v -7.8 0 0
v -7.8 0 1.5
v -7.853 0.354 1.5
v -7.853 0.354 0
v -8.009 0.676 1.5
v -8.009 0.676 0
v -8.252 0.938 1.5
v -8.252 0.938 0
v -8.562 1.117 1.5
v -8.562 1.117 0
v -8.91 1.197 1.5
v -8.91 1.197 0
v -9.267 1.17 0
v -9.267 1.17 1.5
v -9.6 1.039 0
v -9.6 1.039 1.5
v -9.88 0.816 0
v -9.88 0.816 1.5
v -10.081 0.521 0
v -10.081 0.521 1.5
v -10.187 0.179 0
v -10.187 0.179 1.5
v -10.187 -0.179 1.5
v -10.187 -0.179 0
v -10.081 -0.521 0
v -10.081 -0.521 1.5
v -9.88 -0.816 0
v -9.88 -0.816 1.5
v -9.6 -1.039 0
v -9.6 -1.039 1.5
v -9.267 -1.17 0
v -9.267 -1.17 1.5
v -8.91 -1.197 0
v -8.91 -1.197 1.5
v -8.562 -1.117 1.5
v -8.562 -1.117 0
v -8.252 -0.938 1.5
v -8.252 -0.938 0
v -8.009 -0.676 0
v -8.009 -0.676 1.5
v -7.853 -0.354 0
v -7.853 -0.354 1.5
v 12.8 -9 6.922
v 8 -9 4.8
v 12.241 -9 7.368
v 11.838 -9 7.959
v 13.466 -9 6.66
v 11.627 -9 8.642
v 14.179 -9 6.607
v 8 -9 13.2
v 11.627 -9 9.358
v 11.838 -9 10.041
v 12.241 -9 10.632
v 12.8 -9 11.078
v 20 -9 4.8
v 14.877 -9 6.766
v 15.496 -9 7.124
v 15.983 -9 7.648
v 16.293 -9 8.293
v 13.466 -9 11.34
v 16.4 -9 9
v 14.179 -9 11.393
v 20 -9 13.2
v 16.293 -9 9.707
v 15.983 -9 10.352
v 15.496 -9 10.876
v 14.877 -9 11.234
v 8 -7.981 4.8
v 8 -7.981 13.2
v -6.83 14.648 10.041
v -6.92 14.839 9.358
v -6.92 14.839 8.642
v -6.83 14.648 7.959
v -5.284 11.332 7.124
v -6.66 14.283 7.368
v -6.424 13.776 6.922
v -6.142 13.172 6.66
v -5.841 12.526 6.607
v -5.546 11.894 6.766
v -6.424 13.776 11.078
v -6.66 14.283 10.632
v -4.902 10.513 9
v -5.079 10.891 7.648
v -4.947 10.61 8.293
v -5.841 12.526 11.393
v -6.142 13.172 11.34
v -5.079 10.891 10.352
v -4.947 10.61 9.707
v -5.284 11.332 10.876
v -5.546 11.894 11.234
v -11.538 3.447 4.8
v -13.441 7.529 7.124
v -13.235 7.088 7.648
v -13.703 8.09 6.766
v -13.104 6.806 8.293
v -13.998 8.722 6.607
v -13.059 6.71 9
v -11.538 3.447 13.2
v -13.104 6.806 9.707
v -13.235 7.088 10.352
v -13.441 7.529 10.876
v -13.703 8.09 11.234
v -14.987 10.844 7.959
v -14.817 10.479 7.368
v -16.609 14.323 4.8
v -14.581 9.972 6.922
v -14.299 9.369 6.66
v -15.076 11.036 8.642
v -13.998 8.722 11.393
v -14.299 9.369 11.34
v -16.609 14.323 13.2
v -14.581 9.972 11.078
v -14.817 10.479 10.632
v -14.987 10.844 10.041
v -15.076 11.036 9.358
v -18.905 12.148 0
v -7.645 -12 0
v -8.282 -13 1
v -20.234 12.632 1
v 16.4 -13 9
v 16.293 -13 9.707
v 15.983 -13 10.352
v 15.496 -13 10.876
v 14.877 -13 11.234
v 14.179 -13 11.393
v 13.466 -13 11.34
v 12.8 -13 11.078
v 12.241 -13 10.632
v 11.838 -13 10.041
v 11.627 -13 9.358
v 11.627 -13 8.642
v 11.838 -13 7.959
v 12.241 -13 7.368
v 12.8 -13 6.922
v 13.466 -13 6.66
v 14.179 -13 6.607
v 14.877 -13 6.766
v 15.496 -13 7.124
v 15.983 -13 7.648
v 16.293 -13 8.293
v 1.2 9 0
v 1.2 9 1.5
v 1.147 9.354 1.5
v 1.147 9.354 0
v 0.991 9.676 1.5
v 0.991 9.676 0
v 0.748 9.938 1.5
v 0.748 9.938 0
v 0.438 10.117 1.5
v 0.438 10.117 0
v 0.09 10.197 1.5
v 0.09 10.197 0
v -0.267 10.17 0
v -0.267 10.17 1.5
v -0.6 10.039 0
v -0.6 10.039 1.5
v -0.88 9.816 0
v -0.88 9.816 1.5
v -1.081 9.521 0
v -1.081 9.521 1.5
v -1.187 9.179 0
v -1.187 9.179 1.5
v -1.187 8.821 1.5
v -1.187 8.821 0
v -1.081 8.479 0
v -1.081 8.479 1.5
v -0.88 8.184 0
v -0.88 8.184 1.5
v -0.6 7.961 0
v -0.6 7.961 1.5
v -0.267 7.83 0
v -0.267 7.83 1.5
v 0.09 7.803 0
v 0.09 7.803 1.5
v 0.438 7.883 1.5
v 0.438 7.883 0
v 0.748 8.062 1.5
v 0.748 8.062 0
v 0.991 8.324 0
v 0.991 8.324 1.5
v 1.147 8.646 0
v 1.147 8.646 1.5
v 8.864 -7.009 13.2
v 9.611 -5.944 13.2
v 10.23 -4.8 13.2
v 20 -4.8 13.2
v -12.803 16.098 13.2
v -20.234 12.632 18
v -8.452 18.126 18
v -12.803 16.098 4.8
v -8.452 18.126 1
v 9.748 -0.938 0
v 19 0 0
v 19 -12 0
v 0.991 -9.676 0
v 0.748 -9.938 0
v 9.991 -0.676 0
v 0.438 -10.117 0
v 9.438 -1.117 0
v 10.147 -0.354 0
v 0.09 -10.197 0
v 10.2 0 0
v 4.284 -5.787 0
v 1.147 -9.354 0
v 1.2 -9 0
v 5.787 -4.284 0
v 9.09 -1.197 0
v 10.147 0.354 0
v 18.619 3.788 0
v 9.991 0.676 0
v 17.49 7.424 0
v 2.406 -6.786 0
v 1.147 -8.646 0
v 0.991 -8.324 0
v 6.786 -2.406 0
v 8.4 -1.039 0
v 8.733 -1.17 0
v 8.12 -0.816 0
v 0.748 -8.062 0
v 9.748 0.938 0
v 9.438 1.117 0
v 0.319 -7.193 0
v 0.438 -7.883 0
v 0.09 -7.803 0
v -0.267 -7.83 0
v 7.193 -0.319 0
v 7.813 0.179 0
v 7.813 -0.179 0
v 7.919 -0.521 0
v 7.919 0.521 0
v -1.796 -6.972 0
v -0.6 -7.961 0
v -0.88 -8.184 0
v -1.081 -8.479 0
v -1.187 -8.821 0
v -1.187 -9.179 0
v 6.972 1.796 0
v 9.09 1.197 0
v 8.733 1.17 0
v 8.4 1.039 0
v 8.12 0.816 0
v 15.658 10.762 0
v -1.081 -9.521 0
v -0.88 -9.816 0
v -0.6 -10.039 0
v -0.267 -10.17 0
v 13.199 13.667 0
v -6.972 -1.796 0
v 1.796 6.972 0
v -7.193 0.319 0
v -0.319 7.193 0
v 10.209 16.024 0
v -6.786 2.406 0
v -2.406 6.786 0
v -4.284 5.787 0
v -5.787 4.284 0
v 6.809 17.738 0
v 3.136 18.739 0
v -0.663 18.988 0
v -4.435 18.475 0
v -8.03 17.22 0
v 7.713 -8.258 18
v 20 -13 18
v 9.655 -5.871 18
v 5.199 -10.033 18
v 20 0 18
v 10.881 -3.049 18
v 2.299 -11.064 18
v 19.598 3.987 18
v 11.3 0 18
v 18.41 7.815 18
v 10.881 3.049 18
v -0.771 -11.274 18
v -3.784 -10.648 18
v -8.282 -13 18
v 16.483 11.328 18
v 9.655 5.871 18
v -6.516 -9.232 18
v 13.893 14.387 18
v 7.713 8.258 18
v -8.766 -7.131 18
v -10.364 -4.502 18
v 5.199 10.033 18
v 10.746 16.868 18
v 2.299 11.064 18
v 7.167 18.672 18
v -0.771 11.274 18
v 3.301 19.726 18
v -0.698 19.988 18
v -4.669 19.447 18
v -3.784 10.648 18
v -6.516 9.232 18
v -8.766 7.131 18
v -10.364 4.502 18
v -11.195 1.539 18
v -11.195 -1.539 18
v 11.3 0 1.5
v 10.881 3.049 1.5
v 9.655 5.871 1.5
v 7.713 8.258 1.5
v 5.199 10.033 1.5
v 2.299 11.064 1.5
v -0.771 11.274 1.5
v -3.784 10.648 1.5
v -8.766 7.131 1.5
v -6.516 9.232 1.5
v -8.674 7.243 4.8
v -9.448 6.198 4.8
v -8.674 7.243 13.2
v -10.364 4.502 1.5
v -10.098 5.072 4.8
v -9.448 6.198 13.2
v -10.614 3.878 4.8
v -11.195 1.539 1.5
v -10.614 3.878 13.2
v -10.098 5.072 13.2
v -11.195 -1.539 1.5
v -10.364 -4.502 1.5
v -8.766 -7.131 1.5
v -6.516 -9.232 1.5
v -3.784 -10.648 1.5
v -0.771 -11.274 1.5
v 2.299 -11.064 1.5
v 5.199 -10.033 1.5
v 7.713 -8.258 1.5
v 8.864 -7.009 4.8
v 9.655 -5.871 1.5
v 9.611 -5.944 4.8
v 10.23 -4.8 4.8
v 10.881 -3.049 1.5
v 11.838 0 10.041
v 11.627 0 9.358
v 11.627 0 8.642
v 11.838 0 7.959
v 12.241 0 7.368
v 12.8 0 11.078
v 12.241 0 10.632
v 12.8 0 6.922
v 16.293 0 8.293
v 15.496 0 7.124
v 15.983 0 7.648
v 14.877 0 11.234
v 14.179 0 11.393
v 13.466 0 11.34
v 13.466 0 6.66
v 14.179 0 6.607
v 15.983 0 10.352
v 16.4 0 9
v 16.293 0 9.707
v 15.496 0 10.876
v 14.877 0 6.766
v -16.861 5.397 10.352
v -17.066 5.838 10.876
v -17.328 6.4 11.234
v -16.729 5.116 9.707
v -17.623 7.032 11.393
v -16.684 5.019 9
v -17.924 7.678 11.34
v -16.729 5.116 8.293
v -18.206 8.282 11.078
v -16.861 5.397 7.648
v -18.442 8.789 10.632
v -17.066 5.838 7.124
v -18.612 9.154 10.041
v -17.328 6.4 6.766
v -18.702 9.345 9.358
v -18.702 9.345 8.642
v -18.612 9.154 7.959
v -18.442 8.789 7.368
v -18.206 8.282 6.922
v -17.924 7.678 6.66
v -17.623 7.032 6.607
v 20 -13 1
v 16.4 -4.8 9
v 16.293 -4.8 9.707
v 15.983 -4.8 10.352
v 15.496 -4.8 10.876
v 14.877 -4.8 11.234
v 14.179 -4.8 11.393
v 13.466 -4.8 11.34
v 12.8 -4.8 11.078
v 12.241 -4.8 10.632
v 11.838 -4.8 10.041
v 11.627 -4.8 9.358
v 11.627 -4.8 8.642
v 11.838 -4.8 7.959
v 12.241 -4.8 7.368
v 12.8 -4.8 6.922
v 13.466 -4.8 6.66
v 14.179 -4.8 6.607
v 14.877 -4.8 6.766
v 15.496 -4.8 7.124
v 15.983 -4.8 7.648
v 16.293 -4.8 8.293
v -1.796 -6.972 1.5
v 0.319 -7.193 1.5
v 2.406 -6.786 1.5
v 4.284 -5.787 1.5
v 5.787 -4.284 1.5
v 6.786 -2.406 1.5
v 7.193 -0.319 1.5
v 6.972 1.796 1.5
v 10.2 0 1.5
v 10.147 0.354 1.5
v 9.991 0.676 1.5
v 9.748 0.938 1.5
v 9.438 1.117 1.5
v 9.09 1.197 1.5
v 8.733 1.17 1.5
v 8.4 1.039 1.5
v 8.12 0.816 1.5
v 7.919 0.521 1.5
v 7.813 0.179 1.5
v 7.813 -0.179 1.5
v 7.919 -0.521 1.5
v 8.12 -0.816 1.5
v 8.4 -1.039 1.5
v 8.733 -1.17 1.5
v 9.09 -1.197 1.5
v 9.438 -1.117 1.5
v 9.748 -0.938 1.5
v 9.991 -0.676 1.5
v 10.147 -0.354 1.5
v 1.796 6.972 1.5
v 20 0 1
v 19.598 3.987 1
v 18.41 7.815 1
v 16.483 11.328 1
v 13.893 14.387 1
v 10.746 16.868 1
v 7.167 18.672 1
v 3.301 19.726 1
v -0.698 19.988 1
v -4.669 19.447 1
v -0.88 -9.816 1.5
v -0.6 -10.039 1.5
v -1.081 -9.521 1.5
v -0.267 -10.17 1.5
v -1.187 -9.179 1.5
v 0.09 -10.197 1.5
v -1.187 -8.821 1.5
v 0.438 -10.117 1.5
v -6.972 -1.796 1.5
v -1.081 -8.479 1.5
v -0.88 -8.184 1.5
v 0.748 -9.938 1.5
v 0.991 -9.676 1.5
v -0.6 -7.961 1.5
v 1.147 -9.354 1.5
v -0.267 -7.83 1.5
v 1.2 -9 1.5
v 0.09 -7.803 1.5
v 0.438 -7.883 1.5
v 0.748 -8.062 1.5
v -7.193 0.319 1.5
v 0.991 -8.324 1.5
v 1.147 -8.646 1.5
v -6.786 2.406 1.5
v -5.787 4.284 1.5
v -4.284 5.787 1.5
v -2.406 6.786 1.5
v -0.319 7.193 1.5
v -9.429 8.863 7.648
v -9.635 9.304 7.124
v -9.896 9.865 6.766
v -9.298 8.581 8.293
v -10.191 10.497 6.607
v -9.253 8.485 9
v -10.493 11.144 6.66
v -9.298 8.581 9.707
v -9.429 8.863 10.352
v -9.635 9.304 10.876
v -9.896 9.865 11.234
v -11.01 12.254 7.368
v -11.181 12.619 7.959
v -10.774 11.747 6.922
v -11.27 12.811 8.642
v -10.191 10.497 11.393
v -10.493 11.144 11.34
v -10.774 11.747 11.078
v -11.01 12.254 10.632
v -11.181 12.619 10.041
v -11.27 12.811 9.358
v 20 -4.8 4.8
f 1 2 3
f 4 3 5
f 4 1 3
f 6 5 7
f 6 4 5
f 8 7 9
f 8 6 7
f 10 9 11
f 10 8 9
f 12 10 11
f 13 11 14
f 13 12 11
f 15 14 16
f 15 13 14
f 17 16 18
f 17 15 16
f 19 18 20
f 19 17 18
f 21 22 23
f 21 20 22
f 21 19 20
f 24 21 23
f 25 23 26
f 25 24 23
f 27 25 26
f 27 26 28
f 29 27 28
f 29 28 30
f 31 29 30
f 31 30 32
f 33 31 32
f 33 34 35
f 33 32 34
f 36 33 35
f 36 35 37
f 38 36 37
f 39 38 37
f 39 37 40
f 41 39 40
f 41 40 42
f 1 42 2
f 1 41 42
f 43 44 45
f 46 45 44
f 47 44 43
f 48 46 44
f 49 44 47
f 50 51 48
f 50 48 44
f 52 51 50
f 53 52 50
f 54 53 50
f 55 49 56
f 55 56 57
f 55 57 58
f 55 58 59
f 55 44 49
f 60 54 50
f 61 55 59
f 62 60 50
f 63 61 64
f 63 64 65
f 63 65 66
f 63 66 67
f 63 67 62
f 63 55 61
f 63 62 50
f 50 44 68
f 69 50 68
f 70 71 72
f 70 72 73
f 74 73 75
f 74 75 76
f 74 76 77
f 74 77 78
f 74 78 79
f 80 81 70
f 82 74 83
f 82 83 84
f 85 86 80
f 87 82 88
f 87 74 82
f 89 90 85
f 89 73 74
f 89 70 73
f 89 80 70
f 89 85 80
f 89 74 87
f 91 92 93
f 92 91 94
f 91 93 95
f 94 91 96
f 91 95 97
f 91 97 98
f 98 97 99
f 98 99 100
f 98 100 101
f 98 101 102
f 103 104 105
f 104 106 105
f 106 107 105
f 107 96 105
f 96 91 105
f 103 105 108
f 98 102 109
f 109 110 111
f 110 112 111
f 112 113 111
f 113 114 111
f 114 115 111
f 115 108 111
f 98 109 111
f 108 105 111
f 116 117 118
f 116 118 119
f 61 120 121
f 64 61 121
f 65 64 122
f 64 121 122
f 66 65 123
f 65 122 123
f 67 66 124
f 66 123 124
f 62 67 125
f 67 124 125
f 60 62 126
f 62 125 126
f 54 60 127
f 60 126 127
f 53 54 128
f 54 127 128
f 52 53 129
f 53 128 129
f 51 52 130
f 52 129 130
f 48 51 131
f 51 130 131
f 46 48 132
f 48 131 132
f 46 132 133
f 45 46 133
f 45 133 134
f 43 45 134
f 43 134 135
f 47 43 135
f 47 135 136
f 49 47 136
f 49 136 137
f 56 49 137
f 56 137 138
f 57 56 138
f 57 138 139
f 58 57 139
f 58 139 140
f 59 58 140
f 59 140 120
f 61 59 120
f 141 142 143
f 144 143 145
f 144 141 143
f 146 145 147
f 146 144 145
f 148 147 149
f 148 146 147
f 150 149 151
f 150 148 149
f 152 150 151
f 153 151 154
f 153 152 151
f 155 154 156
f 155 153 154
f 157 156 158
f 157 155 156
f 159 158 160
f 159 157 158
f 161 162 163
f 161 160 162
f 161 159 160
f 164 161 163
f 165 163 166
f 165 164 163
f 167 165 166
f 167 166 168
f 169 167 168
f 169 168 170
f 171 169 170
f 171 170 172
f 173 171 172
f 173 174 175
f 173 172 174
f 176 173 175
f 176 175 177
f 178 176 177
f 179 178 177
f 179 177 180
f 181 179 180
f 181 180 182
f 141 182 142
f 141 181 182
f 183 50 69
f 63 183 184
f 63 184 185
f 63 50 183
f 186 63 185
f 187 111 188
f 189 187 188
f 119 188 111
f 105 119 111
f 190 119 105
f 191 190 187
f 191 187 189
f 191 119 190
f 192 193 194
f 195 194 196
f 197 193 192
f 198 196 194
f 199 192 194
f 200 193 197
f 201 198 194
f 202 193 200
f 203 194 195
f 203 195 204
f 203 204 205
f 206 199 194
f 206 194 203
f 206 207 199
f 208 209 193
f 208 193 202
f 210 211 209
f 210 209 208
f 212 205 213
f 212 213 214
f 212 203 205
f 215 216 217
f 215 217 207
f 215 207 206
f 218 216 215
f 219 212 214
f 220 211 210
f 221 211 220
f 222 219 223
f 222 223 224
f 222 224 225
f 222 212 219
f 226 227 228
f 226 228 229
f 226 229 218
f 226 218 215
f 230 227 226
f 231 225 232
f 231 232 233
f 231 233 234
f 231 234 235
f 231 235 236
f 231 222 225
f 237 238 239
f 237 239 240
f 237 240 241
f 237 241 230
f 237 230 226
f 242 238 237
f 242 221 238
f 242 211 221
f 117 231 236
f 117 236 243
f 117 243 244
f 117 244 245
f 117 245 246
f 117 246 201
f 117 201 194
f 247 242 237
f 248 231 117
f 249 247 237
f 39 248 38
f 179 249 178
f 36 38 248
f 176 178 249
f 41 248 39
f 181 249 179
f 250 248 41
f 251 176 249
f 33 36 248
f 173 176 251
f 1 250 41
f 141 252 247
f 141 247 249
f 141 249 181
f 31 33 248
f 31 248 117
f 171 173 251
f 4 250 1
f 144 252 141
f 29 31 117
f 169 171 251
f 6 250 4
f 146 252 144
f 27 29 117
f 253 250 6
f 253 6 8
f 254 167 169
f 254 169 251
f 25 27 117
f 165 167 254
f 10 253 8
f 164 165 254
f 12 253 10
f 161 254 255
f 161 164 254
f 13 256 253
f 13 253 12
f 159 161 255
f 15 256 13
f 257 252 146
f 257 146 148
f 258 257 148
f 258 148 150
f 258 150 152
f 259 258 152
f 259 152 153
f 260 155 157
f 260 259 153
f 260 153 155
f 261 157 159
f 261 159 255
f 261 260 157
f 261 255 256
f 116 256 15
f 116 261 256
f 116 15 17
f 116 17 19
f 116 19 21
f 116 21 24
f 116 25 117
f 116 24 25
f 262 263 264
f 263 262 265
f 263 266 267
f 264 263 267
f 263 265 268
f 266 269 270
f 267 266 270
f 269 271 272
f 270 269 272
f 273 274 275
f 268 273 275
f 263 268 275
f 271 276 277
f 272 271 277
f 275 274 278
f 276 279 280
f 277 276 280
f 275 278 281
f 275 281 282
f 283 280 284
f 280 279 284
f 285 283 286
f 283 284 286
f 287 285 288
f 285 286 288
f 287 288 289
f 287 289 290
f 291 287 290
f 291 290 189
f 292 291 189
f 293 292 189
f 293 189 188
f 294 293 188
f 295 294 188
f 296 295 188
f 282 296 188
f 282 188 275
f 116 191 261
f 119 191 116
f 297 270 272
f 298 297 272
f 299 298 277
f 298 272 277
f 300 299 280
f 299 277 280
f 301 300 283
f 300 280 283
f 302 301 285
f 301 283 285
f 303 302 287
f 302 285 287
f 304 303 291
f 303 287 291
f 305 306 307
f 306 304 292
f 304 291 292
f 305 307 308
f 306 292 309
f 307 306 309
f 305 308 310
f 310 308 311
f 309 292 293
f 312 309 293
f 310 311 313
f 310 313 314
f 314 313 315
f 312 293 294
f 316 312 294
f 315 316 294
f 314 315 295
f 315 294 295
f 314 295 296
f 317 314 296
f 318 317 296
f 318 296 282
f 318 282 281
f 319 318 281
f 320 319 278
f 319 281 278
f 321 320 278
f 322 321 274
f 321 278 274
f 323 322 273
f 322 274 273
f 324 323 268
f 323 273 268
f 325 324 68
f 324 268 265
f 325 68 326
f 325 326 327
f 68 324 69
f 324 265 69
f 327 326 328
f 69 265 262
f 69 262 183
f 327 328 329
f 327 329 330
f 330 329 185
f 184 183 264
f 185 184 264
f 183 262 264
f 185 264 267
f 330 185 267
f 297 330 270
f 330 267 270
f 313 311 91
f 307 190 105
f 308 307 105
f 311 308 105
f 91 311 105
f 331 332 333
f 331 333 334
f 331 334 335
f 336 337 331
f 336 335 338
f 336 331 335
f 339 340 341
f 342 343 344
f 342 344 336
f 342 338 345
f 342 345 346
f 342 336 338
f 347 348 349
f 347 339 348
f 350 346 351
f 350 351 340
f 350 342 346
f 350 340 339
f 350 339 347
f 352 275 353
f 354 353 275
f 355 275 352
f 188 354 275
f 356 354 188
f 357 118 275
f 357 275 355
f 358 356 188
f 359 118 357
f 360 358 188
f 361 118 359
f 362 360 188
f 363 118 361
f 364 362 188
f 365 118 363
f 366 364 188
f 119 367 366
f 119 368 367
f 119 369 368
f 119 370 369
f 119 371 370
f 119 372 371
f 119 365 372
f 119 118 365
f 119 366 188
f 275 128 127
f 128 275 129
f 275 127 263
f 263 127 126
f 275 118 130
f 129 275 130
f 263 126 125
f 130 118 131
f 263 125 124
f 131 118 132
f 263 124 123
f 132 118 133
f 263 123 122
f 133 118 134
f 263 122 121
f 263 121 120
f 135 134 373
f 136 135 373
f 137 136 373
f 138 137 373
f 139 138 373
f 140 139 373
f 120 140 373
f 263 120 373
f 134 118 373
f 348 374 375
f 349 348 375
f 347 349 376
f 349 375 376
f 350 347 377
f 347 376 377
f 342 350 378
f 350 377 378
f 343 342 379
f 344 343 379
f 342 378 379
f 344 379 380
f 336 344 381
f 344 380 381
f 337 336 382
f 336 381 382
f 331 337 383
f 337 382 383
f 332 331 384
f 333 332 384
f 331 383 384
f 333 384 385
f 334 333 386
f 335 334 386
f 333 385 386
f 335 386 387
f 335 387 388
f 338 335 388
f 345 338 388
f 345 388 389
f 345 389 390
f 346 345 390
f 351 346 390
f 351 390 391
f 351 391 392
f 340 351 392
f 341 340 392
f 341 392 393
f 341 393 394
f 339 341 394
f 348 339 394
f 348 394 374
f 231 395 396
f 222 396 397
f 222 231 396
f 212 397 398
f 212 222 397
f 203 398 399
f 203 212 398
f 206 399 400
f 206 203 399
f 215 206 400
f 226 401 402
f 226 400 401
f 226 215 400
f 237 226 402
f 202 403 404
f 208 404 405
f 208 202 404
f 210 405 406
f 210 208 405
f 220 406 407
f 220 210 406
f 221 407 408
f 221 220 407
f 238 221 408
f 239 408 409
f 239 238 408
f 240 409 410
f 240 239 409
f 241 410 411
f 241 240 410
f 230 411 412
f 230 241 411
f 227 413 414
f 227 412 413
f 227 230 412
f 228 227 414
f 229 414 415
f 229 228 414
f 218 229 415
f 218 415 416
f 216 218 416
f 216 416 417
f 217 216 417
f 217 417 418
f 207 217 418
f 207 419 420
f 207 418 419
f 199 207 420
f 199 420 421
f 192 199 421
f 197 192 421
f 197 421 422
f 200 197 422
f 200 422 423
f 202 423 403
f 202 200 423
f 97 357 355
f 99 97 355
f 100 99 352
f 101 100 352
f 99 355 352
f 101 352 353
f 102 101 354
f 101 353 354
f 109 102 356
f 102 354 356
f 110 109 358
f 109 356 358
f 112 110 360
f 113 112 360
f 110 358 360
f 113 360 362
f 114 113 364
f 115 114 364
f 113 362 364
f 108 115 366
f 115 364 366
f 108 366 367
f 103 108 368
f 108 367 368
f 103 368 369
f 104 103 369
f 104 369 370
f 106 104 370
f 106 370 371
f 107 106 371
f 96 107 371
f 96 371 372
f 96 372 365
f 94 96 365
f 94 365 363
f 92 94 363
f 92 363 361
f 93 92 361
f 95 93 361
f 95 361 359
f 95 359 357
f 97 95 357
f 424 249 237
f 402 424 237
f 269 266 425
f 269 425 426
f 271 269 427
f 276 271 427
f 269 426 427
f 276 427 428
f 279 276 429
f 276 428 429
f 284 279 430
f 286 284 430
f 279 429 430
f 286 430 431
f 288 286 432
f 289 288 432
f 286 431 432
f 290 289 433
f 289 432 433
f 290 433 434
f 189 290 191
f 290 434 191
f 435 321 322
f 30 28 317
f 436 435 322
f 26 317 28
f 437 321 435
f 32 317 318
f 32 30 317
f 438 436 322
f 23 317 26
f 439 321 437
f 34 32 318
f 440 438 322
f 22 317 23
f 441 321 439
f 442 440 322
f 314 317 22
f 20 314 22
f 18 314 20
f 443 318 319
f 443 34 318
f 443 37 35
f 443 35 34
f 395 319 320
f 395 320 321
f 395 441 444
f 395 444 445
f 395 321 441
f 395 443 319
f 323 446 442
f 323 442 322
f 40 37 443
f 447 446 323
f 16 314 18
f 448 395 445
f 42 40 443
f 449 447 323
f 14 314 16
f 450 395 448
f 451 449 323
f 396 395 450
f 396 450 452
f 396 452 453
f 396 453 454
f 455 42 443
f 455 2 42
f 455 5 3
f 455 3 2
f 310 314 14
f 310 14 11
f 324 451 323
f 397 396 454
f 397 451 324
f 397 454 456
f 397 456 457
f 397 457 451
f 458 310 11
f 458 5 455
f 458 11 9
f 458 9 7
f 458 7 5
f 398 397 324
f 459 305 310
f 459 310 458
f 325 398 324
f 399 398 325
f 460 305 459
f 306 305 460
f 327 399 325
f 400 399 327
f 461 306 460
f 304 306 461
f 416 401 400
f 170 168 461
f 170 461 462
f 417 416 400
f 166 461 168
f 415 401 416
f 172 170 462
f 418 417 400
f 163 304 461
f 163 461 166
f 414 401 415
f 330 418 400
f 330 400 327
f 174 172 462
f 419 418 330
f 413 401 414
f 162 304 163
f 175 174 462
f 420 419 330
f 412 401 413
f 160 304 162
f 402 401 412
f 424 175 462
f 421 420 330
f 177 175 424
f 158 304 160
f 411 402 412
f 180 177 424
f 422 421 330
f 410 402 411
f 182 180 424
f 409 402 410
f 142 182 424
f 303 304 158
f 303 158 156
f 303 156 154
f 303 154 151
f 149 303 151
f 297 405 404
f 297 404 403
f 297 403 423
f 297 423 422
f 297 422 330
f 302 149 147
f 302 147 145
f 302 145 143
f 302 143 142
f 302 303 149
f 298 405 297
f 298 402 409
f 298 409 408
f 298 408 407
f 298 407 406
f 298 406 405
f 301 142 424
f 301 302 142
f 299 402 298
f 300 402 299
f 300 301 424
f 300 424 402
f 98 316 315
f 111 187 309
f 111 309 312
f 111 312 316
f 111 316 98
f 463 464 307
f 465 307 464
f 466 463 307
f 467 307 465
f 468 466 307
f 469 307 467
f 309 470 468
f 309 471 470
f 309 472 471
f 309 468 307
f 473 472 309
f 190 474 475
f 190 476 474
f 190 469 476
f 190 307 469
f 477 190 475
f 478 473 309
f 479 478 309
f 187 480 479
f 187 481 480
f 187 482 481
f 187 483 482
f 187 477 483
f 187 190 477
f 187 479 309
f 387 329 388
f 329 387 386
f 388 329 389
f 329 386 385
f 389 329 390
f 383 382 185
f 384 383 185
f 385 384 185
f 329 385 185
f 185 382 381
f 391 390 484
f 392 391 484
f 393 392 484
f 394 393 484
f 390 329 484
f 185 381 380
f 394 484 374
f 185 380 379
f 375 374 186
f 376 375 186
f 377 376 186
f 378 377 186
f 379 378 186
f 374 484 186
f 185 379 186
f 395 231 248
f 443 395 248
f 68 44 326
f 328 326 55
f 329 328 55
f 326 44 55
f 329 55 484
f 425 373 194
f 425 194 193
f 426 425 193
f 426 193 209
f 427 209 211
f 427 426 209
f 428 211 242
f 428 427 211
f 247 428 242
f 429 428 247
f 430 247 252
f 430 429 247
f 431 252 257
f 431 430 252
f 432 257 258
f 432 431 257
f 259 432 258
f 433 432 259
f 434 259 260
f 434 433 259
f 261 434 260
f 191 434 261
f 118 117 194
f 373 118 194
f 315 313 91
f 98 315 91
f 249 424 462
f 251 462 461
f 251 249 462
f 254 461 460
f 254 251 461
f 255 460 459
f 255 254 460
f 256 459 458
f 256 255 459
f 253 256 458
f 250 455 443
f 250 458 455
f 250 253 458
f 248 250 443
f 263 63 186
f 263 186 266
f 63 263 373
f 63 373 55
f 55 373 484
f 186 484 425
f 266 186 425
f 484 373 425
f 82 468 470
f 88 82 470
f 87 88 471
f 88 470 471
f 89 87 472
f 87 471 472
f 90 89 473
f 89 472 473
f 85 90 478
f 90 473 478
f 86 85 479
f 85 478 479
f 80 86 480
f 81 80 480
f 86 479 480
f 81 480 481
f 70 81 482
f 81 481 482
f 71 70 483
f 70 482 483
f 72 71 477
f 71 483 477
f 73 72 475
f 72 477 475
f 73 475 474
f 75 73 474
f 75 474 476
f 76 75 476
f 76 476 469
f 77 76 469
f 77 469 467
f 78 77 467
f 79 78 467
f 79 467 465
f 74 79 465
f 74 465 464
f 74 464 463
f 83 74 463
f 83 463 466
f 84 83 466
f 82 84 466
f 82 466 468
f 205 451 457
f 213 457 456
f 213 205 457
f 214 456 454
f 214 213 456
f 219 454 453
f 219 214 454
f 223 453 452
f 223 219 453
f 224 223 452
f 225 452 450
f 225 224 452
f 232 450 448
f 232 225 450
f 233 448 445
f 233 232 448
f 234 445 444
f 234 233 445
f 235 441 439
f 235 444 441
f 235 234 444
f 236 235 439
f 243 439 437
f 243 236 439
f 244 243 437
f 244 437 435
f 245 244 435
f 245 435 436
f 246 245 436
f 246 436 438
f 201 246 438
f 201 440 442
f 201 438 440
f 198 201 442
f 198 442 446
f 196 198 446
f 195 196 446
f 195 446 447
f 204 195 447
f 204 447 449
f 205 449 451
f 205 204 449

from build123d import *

# Parameters (mm, degrees)
SKETCH_R             = 1.2
PAD_DEPTH            = 18
POCKET001_DEPTH      = 0.001
POCKET001_DEPTH_BACK = 18.001
SKETCH001_R          = 11.3
POCKET_DEPTH         = 16.5
SKETCH003_R          = 2.4
POCKET002_DEPTH      = 13
SKETCH004_R          = 2.4
POCKET003_DEPTH      = 13
SKETCH005_W          = 4.2
SKETCH005_H          = 8.4
POCKET004_DEPTH      = 12
SKETCH007_W          = 4.2
SKETCH007_H          = 8.4
POCKET005_DEPTH      = 12
CHAMFER_SIZE         = 1


with BuildPart() as part:
    # Sketch → Pad (new body)
    with BuildSketch(Plane.XY):
        with BuildLine():
            Line((-8.2819133905, -13), (-20.2343664663, 12.6321183381))
            Line((-20.2343664663, 12.6321183381), (-8.4523652348, 18.1261557407))
            ThreePointArc((20, 0), (10.7459921669, 16.8678289163), (-8.4523652348, 18.1261557407))
            Line((20, -13), (20, 0))
            Line((-8.2819133905, -13), (20, -13))
        make_face()
        with Locations((0, 9)):
            Circle(SKETCH_R, mode=Mode.SUBTRACT)
        with Locations((0, -9)):
            Circle(SKETCH_R, mode=Mode.SUBTRACT)
        with Locations((9, 0)):
            Circle(SKETCH_R, mode=Mode.SUBTRACT)
        with Locations((-9, 0)):
            Circle(SKETCH_R, mode=Mode.SUBTRACT)
    extrude(amount=PAD_DEPTH)

    # Sketch002 → Pocket001 (cut, two sides)
    with BuildSketch(Plane.XY) as pocket001_sk:
        with BuildLine():
            Line((-1.7956262222, -6.9724978645), (-6.9724978645, -1.7956262222))
            ThreePointArc((1.7956262222, 6.9724978645), (-5.0911688245, 5.0911688245), (-6.9724978645, -1.7956262222))
            Line((1.7956262222, 6.9724978645), (6.9724978645, 1.7956262222))
            ThreePointArc((-1.7956262222, -6.9724978645), (5.0911688245, -5.0911688245), (6.9724978645, 1.7956262222))
        make_face()
    extrude(amount=-POCKET001_DEPTH, mode=Mode.SUBTRACT)
    extrude(pocket001_sk.sketch, amount=POCKET001_DEPTH_BACK, mode=Mode.SUBTRACT)

    # Sketch001 (on Face11 of Pad) → Pocket (cut)
    with BuildSketch(Plane.XY.offset(18)):
        Circle(SKETCH001_R)
    extrude(amount=-POCKET_DEPTH, mode=Mode.SUBTRACT)

    # Sketch003 (on Face1 of Pocket) → Pocket002 (cut)
    with BuildSketch(Plane(origin=(-11.7820012315, -5.4940374026, 0), x_dir=(0.4226182617, -0.906307787, 0), z_dir=(-0.906307787, -0.4226182617, 0))):
        with Locations((-14, 9)):
            Circle(SKETCH003_R)
    extrude(amount=-POCKET002_DEPTH, mode=Mode.SUBTRACT)

    # Sketch004 (on Face2 of Pocket002) → Pocket003 (cut)
    with BuildSketch(Plane.XZ.offset(13)):
        with Locations((14, 9)):
            Circle(SKETCH004_R)
    extrude(amount=-POCKET003_DEPTH, mode=Mode.SUBTRACT)

    # Sketch005 (on Face5 of Pocket003) → Pocket004 (cut)
    with BuildSketch(Plane(origin=(-8.4523652348, 18.1261557407, 0), x_dir=(-0.906307787, -0.4226182617, 0), z_dir=(-0.4226182617, 0.906307787, 0))):
        with Locations((6.9, 9)):
            Rectangle(SKETCH005_W, SKETCH005_H)
    extrude(amount=-POCKET004_DEPTH, mode=Mode.SUBTRACT)

    # Sketch007 (on Face7 of Pocket004) → Pocket005 (cut)
    with BuildSketch(Plane.YZ.offset(20)):
        with Locations((-6.9, 9)):
            Rectangle(SKETCH007_W, SKETCH007_H)
    extrude(amount=-POCKET005_DEPTH, mode=Mode.SUBTRACT)

    # Chamfer
    chamfer_edges = [part.edges().sort_by_distance(p)[0] for p in [
        (20, -6.5, 0),
        (10.745992, 16.867829, 0),
        (5.859043, -13, 0),
        (-14.25814, -0.183941, 0),
        (-14.343366, 15.379137, 0),
    ]]
    chamfer(chamfer_edges, length=CHAMFER_SIZE)


solid = part.part
